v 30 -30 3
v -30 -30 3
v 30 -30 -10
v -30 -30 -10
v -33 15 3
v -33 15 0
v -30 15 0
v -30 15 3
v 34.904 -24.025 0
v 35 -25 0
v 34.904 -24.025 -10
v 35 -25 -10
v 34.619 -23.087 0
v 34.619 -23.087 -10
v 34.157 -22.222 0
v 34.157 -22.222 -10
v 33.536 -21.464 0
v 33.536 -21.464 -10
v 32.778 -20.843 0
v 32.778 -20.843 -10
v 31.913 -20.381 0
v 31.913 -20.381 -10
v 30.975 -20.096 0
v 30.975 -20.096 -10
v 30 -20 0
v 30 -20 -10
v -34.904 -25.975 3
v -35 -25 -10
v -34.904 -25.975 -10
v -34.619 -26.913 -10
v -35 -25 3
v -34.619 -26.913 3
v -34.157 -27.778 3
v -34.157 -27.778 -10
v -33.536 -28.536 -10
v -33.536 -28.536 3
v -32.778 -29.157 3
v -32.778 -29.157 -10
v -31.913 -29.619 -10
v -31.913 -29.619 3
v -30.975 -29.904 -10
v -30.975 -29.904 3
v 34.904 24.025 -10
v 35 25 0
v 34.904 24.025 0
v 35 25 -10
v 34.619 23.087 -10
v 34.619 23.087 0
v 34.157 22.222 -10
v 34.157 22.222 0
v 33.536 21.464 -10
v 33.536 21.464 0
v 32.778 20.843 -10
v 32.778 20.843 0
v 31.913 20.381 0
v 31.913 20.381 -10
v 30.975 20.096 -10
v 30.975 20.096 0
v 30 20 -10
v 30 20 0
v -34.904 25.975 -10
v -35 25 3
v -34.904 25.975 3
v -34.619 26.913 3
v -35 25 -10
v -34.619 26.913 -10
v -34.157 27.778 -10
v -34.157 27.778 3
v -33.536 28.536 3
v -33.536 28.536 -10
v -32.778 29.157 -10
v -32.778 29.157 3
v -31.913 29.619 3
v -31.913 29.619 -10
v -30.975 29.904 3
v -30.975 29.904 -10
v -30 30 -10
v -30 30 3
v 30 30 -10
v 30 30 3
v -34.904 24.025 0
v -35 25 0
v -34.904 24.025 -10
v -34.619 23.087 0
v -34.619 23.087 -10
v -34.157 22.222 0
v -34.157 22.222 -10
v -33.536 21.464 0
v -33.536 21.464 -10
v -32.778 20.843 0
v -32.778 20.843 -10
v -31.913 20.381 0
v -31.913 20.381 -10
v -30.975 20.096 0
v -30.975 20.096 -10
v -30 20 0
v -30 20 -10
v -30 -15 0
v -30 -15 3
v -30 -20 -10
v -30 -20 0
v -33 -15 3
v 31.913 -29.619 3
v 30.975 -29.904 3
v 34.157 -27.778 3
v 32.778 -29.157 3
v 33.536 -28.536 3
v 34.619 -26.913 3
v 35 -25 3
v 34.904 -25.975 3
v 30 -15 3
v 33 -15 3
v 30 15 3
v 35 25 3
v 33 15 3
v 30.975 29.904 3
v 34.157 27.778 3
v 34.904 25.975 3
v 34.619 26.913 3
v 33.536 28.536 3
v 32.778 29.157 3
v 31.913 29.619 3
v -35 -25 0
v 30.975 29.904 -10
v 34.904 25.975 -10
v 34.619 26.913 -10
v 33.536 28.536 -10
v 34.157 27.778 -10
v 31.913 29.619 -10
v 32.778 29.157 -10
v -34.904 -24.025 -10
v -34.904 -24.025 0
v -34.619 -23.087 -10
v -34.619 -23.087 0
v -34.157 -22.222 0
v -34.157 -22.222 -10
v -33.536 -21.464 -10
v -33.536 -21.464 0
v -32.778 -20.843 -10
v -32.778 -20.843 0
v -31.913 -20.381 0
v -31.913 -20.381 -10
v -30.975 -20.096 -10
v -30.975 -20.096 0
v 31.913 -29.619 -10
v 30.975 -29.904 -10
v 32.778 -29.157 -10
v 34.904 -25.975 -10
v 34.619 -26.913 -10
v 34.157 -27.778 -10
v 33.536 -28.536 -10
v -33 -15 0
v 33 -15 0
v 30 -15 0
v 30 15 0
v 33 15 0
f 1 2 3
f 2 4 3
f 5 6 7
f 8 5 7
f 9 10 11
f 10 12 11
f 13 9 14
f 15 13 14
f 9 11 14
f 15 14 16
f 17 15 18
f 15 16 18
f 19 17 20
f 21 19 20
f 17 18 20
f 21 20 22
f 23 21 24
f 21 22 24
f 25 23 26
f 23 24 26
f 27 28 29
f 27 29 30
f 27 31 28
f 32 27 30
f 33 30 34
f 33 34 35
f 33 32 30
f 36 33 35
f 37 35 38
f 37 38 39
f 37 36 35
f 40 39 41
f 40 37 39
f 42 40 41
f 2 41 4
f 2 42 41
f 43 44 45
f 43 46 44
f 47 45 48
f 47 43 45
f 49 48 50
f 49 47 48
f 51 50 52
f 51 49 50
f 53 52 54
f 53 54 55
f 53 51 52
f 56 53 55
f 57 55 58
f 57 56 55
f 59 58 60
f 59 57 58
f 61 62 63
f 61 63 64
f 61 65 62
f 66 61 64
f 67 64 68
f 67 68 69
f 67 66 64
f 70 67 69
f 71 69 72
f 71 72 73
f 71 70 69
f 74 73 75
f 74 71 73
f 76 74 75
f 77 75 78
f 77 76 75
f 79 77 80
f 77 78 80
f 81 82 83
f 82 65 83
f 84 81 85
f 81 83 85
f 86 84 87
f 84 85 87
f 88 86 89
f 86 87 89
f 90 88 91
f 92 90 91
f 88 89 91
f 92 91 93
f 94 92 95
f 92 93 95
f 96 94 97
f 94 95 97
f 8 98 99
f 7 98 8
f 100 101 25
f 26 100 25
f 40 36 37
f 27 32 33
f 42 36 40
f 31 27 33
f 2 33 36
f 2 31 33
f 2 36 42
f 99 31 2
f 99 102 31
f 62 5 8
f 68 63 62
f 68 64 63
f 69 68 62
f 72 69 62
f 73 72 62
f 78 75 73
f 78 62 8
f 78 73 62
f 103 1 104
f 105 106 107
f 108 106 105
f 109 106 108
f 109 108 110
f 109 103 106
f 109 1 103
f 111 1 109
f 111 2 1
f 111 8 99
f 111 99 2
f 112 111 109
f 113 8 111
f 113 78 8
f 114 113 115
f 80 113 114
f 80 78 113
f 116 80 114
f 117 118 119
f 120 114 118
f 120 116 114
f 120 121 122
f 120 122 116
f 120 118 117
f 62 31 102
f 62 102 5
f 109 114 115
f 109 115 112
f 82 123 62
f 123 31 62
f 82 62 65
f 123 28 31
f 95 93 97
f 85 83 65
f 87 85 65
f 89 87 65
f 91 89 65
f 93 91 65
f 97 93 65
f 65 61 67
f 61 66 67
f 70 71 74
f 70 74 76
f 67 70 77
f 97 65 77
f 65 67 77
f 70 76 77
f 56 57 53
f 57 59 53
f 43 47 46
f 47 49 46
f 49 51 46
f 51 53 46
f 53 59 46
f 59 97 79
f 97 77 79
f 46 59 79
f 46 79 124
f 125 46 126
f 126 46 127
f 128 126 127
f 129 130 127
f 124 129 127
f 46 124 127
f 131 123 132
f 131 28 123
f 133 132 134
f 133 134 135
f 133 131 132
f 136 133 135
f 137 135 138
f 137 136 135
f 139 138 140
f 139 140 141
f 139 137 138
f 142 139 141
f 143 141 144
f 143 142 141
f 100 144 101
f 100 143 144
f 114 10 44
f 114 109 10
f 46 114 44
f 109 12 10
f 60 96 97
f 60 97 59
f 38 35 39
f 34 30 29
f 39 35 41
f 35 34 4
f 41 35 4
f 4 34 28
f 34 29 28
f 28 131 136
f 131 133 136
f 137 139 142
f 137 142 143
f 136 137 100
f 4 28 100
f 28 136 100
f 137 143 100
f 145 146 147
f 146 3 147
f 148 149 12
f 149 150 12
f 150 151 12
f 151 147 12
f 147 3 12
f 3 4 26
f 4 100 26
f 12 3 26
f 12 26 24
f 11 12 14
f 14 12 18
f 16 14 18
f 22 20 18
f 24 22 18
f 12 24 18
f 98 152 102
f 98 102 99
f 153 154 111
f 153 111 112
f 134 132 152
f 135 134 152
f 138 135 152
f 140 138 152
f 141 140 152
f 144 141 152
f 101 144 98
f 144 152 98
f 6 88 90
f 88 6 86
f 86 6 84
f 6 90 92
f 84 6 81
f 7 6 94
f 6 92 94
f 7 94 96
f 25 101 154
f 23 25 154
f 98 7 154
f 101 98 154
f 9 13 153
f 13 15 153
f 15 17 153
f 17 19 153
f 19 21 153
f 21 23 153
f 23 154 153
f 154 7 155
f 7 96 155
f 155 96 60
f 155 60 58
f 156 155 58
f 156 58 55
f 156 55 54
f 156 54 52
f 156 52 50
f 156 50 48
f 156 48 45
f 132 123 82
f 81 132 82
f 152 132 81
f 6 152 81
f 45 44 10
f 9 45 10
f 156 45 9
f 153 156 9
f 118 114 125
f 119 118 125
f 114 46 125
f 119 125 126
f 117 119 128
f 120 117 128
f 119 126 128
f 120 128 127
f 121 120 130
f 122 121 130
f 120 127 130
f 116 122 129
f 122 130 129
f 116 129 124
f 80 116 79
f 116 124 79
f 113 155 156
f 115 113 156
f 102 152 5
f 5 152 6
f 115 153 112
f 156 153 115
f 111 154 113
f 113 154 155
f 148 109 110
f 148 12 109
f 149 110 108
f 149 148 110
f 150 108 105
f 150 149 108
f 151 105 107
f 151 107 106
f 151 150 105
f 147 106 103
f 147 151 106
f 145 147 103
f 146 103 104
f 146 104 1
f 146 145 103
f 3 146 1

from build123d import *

# Parameters (mm, degrees)
F0_W     = 70
F0_H     = 60
F1_DEPTH = 3
F2_W     = 3
F2_H     = 30
F3_DEPTH = 25
F4_W     = 70
F4_H     = 10
F5_DEPTH = 10
F6_R     = 4.99999


# Not quite as in the source:
# - a fillet or chamfer is up to 0.001 mm smaller than in the source, because OpenCascade refuses the exact size


with BuildPart() as f1:
    # F0 (on Top) → F1 (new body)
    with BuildSketch(Plane.XY):
        Rectangle(F0_W, F0_H)
    extrude(amount=F1_DEPTH)

    # F2 (on Top) → F3 (cut)
    with BuildSketch(Plane.XY):
        with Locations((31.5, 0)):
            Rectangle(F2_W, F2_H)
        with Locations((-31.5, 0)):
            Rectangle(F2_W, F2_H)
    extrude(amount=F3_DEPTH, mode=Mode.SUBTRACT)

    # F4 (on Top) → F5 (join)
    with BuildSketch(Plane.XY):
        with Locations((0, 25)):
            Rectangle(F4_W, F4_H)
        with Locations((0, -25)):
            Rectangle(F4_W, F4_H)
    extrude(amount=-F5_DEPTH)

    # F6 (radius 5 in the source; OpenCascade refuses exactly that, so slightly less here)
    f6_edges = [f1.edges().sort_by_distance(p)[0] for p in [
        (35, -30, -3.5),
        (-35, -30, -3.5),
        (-35, -20, -5),
        (35, -20, -5),
        (35, 20, -5),
        (35, 30, -3.5),
        (-35, 20, -5),
        (-35, 30, -3.5),
    ]]
    fillet(f6_edges, radius=F6_R)


solid = f1.part
